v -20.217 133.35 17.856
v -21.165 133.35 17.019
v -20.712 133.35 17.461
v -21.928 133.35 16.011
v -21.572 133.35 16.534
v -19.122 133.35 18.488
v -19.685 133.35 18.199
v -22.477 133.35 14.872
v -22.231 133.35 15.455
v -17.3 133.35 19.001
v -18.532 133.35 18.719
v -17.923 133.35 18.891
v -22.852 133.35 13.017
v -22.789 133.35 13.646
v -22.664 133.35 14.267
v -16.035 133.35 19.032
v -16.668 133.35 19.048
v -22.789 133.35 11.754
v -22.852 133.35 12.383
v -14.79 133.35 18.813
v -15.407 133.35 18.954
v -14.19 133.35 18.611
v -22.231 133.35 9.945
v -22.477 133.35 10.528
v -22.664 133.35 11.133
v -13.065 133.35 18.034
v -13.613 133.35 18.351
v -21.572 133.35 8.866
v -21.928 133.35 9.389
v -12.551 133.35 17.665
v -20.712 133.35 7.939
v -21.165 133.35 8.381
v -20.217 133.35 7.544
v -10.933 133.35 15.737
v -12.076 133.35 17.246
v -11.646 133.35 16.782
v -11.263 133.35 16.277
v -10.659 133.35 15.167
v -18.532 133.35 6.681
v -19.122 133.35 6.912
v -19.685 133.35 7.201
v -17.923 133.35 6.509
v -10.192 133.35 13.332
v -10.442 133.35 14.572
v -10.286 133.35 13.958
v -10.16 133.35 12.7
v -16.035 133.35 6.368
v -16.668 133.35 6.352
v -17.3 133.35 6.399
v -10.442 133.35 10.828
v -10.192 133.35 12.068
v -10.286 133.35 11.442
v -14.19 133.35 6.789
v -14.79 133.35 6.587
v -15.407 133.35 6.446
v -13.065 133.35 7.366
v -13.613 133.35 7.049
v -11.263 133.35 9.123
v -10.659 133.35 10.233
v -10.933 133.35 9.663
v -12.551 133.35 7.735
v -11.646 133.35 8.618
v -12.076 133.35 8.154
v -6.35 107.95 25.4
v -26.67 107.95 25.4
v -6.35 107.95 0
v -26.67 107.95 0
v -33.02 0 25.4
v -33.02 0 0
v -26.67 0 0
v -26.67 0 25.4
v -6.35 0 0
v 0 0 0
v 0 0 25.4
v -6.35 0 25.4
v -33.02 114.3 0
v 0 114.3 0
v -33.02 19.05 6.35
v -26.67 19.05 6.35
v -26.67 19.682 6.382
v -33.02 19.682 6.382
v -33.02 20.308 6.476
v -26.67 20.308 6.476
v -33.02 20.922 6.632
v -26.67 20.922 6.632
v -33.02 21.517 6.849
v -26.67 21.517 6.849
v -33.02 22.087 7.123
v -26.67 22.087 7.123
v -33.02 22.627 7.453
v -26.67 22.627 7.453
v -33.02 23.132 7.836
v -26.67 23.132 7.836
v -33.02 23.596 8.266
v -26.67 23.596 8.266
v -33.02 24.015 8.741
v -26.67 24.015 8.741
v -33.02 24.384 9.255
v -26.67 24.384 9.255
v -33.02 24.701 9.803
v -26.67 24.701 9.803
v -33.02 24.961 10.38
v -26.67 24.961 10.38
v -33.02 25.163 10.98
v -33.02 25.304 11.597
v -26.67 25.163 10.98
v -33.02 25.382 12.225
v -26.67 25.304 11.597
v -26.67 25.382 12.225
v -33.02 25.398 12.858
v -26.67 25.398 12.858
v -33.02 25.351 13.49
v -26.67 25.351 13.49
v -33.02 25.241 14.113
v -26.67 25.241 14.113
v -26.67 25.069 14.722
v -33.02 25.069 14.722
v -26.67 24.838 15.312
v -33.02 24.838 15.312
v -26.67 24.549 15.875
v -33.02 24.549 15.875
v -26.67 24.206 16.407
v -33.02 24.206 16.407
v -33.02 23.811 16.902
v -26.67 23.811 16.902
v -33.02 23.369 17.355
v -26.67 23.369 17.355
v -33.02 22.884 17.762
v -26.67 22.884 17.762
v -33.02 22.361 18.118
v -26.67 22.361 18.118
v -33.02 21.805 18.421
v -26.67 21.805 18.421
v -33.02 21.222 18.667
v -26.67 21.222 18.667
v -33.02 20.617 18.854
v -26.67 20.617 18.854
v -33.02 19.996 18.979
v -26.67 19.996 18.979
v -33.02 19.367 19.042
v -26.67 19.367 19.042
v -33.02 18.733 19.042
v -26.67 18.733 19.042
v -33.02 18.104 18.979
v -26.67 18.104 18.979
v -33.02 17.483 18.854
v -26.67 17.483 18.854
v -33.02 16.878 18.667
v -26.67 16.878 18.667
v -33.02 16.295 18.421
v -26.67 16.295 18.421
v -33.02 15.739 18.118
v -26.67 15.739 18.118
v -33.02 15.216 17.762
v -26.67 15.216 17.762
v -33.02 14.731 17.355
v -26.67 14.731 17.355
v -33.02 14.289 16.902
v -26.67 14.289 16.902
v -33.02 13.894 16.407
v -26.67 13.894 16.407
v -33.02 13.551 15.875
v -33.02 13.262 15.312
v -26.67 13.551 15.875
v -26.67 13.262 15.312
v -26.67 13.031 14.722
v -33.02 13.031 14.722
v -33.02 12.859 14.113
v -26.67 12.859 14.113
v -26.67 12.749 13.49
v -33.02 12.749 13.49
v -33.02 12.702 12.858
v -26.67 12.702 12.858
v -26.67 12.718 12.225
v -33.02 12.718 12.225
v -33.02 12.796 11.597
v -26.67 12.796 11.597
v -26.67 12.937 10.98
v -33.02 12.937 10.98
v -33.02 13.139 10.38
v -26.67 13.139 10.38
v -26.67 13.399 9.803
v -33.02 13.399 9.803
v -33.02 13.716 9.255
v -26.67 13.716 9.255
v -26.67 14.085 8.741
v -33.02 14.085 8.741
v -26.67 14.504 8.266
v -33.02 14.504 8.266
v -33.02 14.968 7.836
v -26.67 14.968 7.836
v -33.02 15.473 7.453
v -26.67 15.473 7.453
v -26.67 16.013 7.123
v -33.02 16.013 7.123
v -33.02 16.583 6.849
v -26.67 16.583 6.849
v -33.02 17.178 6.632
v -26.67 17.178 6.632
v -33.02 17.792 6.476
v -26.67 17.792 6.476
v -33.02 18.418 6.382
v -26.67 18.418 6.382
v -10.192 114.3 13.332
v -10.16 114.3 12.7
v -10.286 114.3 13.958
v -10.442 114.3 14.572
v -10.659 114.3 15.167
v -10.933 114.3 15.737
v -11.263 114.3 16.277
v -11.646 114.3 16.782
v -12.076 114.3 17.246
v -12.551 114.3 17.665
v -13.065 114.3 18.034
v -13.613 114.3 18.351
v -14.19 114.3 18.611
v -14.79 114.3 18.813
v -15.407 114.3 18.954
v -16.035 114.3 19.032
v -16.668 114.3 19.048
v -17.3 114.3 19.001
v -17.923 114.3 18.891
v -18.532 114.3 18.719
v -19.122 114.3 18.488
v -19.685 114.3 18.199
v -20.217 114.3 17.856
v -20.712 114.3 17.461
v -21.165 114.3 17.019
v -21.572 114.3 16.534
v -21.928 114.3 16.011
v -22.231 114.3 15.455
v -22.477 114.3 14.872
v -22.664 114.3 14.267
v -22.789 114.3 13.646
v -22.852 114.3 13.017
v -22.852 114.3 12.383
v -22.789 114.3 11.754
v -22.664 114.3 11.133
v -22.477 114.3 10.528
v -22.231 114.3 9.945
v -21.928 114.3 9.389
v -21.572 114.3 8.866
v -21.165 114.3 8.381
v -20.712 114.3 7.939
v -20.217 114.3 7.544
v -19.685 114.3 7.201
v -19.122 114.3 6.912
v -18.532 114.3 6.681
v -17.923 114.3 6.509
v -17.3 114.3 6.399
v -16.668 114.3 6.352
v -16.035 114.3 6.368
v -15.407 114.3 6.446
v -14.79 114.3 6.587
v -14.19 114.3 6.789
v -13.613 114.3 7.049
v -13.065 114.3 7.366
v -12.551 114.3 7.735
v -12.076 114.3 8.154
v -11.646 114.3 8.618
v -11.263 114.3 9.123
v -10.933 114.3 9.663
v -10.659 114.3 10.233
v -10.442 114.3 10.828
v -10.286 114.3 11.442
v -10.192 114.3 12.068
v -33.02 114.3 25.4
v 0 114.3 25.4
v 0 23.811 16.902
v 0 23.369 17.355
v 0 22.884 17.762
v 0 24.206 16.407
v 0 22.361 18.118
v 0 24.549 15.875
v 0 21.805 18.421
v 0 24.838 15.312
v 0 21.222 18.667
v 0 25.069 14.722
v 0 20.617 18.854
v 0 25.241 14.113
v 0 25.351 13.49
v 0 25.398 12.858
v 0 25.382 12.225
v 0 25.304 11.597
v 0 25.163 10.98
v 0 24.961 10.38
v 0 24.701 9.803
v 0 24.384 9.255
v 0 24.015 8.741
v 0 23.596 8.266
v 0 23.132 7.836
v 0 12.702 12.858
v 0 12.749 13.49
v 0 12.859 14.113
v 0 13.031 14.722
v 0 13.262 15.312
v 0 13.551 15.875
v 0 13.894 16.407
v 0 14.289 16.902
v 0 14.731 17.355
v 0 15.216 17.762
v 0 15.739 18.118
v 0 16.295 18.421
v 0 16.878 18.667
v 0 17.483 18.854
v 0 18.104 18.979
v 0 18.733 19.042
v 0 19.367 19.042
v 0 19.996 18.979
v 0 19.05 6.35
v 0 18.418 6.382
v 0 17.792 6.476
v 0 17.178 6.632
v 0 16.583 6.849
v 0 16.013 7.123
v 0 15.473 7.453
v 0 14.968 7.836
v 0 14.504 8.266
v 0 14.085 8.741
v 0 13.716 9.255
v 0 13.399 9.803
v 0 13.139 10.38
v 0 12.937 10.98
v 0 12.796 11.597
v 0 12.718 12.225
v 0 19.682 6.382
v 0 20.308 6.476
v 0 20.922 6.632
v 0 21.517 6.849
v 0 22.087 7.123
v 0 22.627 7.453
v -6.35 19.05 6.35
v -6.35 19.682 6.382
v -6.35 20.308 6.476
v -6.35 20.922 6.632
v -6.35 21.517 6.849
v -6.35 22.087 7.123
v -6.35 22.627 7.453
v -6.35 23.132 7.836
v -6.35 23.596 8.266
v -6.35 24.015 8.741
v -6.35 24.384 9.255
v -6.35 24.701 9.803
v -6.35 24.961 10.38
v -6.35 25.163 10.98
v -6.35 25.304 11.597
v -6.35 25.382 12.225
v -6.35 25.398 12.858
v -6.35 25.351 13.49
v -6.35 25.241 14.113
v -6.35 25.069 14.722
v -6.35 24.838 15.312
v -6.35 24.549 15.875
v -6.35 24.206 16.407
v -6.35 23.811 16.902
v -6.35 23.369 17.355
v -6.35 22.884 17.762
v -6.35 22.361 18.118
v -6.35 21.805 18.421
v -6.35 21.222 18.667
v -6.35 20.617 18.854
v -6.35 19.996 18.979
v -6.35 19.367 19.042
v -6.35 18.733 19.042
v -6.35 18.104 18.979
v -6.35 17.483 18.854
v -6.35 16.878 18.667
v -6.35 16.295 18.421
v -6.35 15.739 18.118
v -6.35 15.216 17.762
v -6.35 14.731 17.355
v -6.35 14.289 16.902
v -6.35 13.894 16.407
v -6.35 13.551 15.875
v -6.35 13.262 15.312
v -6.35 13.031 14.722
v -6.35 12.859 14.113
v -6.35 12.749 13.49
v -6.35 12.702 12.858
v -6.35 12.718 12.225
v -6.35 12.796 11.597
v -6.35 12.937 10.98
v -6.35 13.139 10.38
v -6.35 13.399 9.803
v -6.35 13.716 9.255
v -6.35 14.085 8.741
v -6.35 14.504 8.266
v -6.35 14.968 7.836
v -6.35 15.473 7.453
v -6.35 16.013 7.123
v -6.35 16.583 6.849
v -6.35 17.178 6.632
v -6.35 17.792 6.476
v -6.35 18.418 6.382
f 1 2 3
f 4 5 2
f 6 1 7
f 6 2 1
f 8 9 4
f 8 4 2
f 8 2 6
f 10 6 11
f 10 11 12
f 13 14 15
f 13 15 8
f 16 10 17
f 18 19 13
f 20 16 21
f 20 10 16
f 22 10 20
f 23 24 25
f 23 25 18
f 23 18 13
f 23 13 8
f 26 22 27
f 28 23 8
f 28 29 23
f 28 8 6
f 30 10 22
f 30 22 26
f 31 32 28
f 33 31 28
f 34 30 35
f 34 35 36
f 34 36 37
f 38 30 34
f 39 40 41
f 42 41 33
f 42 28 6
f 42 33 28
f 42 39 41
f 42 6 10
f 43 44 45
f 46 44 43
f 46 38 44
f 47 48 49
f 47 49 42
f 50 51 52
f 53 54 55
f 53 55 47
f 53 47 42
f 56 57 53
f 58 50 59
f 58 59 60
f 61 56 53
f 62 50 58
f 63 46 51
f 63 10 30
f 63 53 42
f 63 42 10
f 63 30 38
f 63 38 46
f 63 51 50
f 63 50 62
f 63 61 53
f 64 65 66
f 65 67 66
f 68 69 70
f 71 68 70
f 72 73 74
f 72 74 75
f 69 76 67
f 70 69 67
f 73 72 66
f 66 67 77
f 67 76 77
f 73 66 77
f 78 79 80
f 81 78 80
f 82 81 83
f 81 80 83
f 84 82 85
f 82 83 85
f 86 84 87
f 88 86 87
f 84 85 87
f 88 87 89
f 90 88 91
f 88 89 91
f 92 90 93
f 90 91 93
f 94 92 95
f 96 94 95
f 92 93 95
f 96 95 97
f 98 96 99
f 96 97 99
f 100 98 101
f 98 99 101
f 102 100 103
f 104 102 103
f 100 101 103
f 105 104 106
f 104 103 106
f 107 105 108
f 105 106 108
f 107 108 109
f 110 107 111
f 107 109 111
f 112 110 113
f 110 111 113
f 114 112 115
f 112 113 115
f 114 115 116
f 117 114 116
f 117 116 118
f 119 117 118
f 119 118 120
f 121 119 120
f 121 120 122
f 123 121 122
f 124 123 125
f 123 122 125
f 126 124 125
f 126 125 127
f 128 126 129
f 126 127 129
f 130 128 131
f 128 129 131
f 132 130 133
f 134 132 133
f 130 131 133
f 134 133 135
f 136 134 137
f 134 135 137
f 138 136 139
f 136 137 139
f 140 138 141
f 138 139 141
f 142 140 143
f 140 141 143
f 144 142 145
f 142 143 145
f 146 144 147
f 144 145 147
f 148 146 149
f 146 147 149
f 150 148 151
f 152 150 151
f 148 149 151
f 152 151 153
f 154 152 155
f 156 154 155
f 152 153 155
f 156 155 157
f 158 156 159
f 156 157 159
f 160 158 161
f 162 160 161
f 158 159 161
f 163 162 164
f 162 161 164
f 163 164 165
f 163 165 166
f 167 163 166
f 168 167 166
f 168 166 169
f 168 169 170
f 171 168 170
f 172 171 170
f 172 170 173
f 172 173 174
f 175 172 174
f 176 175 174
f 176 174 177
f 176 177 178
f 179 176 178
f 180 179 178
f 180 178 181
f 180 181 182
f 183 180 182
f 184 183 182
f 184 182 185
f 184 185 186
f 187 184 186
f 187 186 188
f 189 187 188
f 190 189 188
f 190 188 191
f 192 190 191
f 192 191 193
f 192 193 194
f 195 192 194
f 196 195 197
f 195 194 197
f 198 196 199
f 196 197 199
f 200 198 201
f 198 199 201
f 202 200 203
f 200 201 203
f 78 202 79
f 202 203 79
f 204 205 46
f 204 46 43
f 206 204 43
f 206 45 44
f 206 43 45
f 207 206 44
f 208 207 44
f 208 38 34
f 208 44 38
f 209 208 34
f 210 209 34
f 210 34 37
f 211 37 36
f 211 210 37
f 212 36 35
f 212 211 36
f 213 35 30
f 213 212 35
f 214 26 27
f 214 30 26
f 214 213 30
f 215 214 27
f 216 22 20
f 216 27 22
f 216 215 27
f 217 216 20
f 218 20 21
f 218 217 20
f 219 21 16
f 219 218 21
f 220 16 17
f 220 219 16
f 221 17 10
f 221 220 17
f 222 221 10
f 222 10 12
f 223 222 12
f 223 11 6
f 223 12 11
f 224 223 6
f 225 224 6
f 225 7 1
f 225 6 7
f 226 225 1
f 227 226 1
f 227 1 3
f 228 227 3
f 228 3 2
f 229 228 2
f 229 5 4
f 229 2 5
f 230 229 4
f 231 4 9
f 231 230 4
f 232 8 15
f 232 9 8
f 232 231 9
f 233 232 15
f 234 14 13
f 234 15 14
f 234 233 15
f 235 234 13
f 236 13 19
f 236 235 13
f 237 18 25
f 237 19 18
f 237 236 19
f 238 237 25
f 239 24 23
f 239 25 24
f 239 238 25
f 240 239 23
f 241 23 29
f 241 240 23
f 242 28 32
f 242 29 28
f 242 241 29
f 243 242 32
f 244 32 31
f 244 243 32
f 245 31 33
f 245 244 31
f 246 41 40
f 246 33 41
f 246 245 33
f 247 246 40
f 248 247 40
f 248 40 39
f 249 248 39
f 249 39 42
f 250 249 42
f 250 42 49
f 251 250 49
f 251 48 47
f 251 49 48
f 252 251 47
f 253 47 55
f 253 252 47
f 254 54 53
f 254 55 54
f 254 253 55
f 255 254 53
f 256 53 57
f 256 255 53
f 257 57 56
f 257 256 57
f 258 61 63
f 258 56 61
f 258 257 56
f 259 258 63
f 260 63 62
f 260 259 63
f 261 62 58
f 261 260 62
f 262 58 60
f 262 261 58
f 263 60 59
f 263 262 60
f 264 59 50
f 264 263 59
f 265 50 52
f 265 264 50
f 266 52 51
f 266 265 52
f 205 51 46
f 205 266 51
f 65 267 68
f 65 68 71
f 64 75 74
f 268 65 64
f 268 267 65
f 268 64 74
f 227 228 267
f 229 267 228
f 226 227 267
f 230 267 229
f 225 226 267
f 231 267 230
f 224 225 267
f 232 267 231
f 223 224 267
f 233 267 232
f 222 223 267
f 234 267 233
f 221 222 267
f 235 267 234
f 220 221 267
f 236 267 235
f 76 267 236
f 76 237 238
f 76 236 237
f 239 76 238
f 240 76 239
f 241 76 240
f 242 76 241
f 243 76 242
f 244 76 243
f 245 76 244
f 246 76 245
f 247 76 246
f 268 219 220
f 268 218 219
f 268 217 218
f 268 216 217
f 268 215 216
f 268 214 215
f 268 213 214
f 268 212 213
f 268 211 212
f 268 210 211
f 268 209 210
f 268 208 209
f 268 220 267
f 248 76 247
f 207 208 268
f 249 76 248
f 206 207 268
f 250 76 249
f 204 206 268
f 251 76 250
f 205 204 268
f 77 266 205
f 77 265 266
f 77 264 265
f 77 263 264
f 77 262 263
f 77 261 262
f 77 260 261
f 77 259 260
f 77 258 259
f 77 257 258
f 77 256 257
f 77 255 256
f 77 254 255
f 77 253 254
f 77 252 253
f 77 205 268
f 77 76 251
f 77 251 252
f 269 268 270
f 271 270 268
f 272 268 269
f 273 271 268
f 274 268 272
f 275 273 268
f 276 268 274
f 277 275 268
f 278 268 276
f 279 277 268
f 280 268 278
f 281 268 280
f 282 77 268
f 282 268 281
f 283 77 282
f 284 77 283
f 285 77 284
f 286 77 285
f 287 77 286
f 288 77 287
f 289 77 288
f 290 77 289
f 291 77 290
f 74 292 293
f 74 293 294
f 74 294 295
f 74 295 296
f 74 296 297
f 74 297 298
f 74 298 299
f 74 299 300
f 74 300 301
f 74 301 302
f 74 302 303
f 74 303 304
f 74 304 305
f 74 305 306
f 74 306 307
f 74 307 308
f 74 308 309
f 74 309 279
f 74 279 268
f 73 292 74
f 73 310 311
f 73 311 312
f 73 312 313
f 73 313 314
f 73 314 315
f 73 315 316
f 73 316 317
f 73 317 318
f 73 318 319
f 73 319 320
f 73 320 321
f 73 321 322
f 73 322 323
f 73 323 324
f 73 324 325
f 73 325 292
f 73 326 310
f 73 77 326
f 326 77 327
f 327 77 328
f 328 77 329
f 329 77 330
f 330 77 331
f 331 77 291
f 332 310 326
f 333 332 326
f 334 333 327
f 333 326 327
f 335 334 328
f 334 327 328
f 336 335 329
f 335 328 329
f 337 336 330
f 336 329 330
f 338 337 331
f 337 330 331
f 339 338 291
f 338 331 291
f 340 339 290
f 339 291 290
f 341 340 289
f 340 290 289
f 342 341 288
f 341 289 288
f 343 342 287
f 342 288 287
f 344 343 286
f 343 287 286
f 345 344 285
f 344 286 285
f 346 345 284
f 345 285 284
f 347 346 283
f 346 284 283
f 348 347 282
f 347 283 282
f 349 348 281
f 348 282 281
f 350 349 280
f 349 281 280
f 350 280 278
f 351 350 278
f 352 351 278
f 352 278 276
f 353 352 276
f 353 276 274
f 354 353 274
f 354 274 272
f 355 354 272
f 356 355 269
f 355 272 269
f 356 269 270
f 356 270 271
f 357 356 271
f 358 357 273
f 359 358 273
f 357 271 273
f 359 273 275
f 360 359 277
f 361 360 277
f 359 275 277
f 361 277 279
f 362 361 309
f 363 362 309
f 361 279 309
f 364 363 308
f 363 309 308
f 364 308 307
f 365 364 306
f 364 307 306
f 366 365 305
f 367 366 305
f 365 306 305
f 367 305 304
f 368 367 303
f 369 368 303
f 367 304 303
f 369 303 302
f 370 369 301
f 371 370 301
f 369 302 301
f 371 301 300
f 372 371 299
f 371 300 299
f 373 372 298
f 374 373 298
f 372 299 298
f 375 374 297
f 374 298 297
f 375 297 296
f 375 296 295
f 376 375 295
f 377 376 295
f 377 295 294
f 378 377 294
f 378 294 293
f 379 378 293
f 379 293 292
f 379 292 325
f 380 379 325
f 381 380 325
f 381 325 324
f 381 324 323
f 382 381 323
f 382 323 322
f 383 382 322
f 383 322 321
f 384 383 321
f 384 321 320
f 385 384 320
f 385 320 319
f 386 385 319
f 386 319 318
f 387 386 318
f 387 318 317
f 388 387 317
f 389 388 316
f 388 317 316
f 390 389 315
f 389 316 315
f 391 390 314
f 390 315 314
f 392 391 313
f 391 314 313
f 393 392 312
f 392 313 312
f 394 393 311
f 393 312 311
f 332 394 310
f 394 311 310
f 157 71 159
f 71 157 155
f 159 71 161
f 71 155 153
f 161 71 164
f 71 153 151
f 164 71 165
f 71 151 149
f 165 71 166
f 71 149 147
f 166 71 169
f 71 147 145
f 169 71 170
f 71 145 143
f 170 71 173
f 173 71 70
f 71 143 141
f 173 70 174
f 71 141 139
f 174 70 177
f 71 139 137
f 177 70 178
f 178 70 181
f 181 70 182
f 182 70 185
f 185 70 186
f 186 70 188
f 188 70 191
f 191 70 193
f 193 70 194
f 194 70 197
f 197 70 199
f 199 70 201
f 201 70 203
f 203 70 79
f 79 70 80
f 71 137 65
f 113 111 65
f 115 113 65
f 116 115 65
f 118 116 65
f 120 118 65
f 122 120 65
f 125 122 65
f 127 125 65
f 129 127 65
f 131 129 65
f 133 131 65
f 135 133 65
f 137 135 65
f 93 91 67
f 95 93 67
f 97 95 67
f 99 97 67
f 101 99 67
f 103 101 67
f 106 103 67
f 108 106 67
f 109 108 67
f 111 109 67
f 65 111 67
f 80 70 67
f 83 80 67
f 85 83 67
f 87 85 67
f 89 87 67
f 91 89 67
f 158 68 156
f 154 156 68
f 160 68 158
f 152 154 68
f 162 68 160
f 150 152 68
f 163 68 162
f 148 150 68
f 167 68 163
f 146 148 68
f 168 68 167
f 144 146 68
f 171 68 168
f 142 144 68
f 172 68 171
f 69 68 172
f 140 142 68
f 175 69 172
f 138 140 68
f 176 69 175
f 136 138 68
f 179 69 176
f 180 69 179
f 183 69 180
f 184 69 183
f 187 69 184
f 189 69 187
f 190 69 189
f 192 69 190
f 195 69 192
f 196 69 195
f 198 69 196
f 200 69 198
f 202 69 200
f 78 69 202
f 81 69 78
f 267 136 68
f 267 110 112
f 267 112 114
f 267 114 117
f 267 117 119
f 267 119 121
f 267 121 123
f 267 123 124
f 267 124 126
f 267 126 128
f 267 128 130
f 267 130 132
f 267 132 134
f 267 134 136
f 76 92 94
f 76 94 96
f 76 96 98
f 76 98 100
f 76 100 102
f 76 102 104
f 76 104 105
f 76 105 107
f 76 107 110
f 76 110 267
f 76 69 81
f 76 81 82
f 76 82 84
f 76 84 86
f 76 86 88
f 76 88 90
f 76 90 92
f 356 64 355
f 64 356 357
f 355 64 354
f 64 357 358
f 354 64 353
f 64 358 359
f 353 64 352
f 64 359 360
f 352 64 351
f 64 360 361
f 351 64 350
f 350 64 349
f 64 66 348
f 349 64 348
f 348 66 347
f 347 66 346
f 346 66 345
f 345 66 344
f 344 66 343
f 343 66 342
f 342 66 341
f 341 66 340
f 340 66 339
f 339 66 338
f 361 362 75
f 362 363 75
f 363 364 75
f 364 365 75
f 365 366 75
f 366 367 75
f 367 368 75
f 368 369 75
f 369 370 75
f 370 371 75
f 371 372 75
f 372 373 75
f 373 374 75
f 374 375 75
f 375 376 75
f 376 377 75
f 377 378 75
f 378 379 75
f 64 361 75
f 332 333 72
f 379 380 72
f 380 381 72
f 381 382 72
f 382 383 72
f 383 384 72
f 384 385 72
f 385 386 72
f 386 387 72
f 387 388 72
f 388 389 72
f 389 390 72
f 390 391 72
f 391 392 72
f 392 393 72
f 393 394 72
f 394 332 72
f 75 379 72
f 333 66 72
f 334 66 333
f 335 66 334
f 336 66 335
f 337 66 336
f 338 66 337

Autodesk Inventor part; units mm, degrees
ref_plane "YZ Plane" through (0, 0, 0) normal (1, 0, 0) x (0, 1, 0)
ref_plane "XZ Plane" through (0, 0, 0) normal (0, 1, 0) x (-1, 0, 0)
ref_plane "XY Plane" through (0, 0, 0) normal (0, 0, 1) x (1, 0, 0)
sketch "Sketch1" plane through (0, 0, 0) normal (0, 0, 1) x (1, 0, 0)
  line L0 (-33.02, 0) -> (-33.02, 114.3)
  line L1 (-33.02, 114.3) -> (0, 114.3)
  line L2 (0, 114.3) -> (0, 0)
  line L3 (-33.02, 0) -> (-26.67, 0)
  line L4 (-26.67, 0) -> (-26.67, 107.95)
  line L5 (-33.02, 114.3) -> (-33.02, 107.95)
  line L6 (-26.67, 107.95) -> (-6.35, 107.95)
  line L7 (0, 114.3) -> (-6.35, 114.3)
  line L8 (-6.35, 107.95) -> (-6.35, 0)
  line L9 (0, 0) -> (-6.35, 0)
  line L10 (-26.67, 0) -> (-33.02, 0)
  dimension "d0" = 33.02
  dimension "d1" = 114.3
  dimension "d2" = 6.35
  dimension "d3" = 6.35
  dimension "d4" = 6.35
  dimension "d11" = 114.3
extrude "Extrusion1" add sketch "Sketch1" along normal blind 25.4
sketch "Sketch2" plane through (0, 0, 0) normal (1, 0, 0) x (0, 0, -1)
  line L0 (0, 0) -> (-25.4, 0) projected
  line L1 (0, 114.3) -> (-25.4, 114.3) projected
  line L2 (-12.7, 0) -> (-12.7, 19.05)
  circle A0 centre (-12.7, 19.05) radius 6.35
  dimension "d7" = 19.05
  dimension "d8" = 12.7
extrude "Extrusion2" cut sketch "Sketch2" against normal blind 254
sketch "Sketch3" plane through (-33.02, 114.3, 0) normal (0, 1, 0) x (1, 0, 0)
  circle A0 centre (16.51, -12.7) radius 6.35
  dimension "d12" = 12.7
extrude "Extrusion3" add sketch "Sketch3" along normal blind 19.05
properties part number "wheel support"
